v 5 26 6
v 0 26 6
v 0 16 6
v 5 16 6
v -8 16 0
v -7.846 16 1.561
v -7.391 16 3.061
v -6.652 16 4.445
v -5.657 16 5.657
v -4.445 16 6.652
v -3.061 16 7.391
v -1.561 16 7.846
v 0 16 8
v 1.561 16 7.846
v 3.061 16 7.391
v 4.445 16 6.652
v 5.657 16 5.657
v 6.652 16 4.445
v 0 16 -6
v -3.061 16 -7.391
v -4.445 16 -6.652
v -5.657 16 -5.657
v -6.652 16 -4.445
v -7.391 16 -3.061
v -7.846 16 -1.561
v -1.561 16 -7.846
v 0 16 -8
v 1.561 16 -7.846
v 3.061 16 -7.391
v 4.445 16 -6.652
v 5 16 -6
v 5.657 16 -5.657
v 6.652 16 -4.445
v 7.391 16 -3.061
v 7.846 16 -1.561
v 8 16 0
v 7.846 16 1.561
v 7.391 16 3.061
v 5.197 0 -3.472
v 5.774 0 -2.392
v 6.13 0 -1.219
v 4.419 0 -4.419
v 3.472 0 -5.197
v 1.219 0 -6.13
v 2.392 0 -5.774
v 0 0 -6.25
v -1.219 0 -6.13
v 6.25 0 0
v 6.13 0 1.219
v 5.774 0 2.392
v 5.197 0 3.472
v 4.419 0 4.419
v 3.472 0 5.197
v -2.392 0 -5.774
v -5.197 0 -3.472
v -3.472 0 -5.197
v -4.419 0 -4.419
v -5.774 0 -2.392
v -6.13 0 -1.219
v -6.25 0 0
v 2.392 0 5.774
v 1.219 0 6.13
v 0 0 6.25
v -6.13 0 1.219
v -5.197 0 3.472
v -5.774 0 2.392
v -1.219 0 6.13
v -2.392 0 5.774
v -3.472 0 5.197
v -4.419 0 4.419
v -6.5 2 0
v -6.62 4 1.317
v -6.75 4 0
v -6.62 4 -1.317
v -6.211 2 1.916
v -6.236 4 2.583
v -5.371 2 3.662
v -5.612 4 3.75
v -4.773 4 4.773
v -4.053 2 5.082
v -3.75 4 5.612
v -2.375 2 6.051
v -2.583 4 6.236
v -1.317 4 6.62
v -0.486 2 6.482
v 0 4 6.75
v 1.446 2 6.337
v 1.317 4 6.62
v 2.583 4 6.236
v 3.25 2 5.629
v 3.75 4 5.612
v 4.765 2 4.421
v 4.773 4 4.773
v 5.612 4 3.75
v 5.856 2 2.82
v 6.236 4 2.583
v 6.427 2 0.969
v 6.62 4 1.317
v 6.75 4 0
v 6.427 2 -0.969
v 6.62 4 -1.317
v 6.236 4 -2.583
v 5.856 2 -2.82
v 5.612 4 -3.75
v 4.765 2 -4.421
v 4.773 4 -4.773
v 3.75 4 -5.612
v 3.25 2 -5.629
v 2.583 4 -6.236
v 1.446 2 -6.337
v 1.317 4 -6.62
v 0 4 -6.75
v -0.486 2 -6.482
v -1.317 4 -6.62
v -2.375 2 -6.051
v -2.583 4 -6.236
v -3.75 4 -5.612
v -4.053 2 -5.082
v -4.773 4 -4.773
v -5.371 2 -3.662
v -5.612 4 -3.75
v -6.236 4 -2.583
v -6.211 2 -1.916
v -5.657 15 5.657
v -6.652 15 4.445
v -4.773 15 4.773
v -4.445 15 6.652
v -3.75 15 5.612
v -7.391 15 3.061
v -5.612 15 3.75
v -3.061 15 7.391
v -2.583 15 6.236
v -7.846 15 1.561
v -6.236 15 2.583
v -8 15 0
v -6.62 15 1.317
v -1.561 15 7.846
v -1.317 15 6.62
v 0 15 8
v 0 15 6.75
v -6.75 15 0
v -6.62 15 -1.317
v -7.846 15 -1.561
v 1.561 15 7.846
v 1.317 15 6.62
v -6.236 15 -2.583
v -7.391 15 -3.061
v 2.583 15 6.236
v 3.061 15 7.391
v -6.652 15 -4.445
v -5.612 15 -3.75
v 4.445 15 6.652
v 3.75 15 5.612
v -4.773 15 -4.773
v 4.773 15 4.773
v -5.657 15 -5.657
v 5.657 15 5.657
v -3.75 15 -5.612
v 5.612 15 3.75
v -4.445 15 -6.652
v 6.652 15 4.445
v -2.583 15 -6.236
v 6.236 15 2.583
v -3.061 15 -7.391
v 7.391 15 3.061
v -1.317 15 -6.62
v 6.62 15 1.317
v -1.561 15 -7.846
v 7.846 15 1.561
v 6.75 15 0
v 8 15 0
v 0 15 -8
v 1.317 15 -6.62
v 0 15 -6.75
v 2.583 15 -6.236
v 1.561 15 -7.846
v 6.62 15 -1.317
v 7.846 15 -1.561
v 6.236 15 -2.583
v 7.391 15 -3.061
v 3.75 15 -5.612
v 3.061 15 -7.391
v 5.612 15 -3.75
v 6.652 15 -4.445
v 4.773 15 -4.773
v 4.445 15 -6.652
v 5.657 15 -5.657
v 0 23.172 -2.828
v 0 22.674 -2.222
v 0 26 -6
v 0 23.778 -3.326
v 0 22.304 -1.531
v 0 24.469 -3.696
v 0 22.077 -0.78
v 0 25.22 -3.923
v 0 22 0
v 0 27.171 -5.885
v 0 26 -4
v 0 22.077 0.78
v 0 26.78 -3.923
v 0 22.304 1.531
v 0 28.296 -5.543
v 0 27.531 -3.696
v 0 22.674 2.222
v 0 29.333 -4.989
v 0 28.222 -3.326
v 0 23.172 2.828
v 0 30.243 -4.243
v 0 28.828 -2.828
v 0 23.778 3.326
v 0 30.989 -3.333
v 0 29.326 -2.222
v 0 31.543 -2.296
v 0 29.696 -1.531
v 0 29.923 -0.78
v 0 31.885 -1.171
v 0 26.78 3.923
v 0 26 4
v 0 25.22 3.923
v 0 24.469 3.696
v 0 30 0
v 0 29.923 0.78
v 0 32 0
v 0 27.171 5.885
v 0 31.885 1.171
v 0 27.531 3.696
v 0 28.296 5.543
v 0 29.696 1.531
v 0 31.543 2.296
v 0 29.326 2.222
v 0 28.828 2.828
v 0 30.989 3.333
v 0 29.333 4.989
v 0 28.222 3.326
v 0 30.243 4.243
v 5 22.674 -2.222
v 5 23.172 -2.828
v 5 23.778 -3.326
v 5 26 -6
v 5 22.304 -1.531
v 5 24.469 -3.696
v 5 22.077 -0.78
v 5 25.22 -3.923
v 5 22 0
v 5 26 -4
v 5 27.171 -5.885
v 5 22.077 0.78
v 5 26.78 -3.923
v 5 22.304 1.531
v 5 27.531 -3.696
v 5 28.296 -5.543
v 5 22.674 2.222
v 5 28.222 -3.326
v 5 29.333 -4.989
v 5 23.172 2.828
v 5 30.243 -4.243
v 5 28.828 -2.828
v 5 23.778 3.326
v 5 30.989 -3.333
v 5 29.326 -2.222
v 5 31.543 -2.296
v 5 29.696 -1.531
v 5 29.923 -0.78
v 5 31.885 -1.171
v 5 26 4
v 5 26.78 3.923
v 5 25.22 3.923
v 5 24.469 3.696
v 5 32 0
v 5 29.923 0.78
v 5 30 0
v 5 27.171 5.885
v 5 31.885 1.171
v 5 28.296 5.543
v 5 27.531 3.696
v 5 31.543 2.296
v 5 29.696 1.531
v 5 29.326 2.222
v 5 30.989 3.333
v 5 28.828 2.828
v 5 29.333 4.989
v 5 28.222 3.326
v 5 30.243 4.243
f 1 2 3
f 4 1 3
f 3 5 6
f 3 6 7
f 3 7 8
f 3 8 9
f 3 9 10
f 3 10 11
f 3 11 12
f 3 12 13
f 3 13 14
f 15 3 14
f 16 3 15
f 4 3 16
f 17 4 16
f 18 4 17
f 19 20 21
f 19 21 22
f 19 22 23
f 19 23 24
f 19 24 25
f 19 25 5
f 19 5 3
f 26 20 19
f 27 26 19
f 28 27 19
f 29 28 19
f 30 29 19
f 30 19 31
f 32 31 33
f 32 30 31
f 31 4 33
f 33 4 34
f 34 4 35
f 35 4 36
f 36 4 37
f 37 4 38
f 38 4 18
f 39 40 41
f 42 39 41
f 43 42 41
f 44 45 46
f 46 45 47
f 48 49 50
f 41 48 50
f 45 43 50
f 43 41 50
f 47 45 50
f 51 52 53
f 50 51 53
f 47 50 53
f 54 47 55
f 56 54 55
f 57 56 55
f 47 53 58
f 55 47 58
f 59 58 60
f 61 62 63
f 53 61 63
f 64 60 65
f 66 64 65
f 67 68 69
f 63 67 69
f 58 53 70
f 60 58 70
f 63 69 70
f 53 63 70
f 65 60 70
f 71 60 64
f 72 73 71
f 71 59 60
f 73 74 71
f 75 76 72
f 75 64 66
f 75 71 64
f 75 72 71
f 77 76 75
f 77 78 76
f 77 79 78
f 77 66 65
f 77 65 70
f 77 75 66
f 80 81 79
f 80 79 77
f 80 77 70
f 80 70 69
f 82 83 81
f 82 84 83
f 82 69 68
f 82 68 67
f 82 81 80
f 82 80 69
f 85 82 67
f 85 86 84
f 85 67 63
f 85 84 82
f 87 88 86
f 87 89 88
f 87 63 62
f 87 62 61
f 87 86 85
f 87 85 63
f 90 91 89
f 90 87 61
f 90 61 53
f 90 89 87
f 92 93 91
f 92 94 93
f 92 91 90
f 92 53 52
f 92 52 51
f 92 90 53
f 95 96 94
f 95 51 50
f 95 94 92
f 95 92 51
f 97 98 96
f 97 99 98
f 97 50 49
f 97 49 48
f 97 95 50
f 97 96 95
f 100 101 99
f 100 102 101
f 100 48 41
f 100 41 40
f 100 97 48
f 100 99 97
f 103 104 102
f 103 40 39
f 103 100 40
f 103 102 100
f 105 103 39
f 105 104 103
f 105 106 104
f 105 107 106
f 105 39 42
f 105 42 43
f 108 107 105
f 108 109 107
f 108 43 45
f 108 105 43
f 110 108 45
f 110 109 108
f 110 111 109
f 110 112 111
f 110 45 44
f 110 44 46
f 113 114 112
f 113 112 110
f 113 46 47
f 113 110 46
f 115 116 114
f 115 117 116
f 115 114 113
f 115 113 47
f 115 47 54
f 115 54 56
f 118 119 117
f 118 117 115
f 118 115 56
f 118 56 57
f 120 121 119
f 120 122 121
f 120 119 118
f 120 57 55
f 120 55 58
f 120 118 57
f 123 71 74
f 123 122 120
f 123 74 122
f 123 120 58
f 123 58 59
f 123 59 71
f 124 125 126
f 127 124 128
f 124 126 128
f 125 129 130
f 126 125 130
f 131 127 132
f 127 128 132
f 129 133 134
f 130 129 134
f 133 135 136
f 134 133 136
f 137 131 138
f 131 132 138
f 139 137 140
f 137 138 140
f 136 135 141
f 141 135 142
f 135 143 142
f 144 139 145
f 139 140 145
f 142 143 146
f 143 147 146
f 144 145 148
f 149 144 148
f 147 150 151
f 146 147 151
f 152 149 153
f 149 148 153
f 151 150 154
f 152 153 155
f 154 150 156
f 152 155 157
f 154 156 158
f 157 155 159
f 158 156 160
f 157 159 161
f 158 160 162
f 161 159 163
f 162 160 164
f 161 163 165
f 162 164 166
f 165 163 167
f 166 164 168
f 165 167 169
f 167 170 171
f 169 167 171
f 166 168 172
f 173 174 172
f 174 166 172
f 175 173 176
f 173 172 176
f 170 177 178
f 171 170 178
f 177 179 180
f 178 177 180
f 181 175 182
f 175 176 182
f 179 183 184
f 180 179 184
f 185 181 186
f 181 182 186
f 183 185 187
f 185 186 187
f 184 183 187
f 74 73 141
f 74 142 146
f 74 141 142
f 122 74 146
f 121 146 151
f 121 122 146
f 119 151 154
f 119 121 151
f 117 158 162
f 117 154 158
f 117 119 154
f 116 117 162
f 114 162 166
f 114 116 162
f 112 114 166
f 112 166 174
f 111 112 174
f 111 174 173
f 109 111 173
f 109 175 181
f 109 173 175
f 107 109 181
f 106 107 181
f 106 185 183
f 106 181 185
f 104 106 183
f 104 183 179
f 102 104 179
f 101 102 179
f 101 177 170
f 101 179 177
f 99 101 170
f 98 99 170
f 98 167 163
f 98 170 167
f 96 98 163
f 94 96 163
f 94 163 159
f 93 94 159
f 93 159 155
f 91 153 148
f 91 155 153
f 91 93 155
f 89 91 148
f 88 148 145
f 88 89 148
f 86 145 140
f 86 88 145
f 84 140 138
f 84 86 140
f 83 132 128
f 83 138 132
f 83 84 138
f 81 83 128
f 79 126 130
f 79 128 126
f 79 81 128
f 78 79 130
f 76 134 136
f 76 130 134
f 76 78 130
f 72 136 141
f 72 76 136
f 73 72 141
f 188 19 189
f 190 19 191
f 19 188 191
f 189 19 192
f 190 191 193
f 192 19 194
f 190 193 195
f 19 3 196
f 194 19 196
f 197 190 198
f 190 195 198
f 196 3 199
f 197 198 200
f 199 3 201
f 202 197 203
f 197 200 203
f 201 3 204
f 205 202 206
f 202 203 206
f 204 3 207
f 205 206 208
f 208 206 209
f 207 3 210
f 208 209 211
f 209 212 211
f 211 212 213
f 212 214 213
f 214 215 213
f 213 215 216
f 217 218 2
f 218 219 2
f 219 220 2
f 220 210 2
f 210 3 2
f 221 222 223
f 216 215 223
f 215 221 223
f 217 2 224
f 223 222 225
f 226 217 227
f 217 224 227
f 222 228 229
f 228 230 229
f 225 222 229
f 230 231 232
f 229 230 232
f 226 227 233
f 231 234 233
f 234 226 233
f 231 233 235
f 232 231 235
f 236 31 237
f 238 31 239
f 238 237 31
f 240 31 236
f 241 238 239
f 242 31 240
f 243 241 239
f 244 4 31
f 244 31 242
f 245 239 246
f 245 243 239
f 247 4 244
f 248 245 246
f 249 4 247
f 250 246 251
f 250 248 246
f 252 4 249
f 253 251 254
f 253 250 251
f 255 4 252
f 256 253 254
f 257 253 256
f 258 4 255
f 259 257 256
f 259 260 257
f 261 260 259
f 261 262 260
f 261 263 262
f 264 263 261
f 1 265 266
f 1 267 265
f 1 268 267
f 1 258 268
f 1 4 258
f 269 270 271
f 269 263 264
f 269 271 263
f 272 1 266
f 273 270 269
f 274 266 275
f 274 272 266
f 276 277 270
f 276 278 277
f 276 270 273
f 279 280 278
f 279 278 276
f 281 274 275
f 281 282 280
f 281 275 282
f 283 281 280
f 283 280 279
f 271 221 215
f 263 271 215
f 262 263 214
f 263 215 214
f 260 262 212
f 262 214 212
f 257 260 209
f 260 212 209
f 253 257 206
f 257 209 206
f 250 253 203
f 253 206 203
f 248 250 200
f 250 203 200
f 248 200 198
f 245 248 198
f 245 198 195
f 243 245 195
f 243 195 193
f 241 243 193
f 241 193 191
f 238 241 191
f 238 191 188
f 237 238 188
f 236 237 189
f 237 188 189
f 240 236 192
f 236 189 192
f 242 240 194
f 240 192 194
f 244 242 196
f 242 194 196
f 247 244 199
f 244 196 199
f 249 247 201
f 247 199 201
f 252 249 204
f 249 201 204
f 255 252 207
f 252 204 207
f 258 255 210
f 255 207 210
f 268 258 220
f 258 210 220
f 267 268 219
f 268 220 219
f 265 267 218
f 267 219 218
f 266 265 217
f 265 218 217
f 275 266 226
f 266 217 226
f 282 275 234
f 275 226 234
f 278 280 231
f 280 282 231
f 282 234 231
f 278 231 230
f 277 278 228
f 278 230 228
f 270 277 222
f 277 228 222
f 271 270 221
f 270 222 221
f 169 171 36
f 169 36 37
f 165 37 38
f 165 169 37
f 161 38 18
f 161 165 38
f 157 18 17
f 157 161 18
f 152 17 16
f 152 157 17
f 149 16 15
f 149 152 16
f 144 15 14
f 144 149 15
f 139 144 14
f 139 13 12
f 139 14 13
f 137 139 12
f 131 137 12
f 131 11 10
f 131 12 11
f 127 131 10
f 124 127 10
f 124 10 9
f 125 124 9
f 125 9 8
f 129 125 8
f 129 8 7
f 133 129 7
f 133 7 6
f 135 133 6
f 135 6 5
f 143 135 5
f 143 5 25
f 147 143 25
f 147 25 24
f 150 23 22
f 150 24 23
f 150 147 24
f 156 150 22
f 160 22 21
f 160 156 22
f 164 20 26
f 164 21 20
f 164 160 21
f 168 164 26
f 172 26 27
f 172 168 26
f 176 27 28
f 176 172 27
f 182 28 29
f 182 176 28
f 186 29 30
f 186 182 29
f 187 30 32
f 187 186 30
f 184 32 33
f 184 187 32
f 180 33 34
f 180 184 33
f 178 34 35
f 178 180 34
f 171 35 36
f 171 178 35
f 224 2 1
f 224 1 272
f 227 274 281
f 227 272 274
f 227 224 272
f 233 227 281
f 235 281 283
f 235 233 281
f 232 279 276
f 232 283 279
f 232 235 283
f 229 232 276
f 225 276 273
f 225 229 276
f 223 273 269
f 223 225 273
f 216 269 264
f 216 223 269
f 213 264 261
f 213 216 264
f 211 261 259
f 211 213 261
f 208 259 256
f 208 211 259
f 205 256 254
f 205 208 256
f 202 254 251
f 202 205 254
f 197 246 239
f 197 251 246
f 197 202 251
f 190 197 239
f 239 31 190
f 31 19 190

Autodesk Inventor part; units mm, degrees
ref_plane "YZ Plane" through (0, 0, 0) normal (1, 0, 0) x (0, 1, 0)
ref_plane "XZ Plane" through (0, 0, 0) normal (0, 1, 0) x (-1, 0, 0)
ref_plane "XY Plane" through (0, 0, 0) normal (0, 0, 1) x (1, 0, 0)
sketch "Sketch1" plane through (0, 0, 0) normal (0, 1, 0) x (-1, 0, 0)
  circle A0 centre (0, 0) radius 6.75
  dimension "d0" = 13.5
extrude "Extrusion1" add sketch "Sketch1" along normal blind 15
chamfer "Chamfer1" distance 4 distance2 0.5 1 edges at (6.75, 0, 0) measured on face at (-6.7281, 10, -0.5431)
sketch "Sketch2" plane through (0, 15, 0) normal (0, 1, 0) x (1, 0, 0)
  circle A0 centre (0, 0) radius 8
  dimension "d6" = 16
extrude "Extrusion2" add sketch "Sketch2" along normal blind 1
sketch "Sketch3" plane through (0, 0, 0) normal (1, 0, 0) x (0, 1, 0)
  circle A0 centre (26, 0) radius 4
  arc A1 (26, -6) -> (26, 6) centre (26, 0) ccw
  line L0 (16, -8) -> (16, 8) projected
  line L1 (26, 6) -> (16, 6)
  line L2 (16, 6) -> (16, -6)
  line L3 (16, -6) -> (26, -6)
  point P0 (0, 0)
  dimension "d9" = 8
  dimension "d10" = 2
  dimension "d11" = 10
extrude "Extrusion3" add sketch "Sketch3" along normal blind 5
properties part number "center_holder_top"
